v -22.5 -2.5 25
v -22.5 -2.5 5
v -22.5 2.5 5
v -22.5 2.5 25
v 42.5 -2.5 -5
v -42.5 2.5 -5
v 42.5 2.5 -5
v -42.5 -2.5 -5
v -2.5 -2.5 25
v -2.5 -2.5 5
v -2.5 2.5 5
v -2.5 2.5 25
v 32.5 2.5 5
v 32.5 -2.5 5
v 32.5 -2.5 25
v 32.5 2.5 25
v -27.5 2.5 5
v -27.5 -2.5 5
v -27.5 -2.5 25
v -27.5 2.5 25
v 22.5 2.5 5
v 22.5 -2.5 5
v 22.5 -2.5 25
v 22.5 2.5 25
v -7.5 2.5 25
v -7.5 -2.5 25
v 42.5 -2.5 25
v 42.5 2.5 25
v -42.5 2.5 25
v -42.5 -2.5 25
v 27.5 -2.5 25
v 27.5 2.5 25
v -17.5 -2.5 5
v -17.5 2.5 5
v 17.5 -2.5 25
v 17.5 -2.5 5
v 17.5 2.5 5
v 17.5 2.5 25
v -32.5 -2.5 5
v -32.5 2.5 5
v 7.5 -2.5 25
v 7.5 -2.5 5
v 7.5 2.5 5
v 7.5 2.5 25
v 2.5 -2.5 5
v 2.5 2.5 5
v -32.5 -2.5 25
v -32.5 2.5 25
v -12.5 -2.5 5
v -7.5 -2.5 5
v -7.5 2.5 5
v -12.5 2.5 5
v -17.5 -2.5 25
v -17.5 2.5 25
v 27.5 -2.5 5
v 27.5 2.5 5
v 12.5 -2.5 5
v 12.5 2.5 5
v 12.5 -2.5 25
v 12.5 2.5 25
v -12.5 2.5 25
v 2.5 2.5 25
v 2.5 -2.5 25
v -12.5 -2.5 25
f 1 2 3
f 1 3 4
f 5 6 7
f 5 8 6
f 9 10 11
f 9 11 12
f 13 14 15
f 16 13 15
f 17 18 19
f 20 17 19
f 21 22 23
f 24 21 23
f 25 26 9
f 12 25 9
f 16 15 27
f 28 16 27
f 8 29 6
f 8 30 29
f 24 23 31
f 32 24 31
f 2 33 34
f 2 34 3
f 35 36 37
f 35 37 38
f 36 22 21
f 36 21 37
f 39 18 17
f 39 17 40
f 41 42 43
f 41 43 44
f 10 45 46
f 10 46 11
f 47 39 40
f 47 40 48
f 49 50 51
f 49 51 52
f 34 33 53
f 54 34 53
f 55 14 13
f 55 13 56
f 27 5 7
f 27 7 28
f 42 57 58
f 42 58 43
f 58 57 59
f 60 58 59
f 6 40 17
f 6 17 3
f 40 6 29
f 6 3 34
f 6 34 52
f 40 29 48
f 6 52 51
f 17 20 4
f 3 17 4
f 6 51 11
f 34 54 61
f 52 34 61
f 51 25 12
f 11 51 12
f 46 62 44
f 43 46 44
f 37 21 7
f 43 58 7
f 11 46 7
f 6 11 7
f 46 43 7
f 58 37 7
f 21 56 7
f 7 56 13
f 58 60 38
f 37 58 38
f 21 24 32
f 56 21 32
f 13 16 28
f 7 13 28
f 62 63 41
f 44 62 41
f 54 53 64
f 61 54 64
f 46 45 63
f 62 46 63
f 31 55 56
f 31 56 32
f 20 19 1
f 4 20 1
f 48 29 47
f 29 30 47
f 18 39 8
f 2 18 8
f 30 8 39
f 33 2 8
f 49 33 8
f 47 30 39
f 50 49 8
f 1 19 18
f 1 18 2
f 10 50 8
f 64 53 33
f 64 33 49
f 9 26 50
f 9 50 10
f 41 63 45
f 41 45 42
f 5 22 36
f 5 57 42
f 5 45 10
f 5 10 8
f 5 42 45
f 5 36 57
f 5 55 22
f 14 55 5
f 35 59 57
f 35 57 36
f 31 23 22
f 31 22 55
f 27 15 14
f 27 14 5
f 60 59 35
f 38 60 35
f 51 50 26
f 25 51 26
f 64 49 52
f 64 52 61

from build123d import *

# Parameters (mm, degrees)
F0_W     = 10
F0_H     = 20
F0_W_2   = 5
F1_DEPTH = 2.5


with BuildPart() as f1:
    # F0 (on Front) → F1 (new body, symmetric)
    with BuildSketch(Plane.XZ):
        Polygon((-42.5, -5), (42.5, -5), (42.5, 5), (32.5, 5), (27.5, 5), (22.5, 5), (17.5, 5), (12.5, 5), (7.5, 5), (2.5, 5), (-2.5, 5), (-7.5, 5), (-12.5, 5), (-17.5, 5), (-22.5, 5), (-27.5, 5), (-32.5, 5), (-42.5, 5), align=None)
        with Locations((37.5, 15)):
            Rectangle(F0_W, F0_H)
        with Locations((-37.5, 15)):
            Rectangle(F0_W, F0_H)
        with Locations((25, 15)):
            Rectangle(F0_W_2, F0_H)
        with Locations((-25, 15)):
            Rectangle(F0_W_2, F0_H)
        with Locations((15, 15)):
            Rectangle(F0_W_2, F0_H)
        with Locations((-15, 15)):
            Rectangle(F0_W_2, F0_H)
        with Locations((5, 15)):
            Rectangle(F0_W_2, F0_H)
        with Locations((-5, 15)):
            Rectangle(F0_W_2, F0_H)
    extrude(amount=F1_DEPTH, both=True)


solid = f1.part
